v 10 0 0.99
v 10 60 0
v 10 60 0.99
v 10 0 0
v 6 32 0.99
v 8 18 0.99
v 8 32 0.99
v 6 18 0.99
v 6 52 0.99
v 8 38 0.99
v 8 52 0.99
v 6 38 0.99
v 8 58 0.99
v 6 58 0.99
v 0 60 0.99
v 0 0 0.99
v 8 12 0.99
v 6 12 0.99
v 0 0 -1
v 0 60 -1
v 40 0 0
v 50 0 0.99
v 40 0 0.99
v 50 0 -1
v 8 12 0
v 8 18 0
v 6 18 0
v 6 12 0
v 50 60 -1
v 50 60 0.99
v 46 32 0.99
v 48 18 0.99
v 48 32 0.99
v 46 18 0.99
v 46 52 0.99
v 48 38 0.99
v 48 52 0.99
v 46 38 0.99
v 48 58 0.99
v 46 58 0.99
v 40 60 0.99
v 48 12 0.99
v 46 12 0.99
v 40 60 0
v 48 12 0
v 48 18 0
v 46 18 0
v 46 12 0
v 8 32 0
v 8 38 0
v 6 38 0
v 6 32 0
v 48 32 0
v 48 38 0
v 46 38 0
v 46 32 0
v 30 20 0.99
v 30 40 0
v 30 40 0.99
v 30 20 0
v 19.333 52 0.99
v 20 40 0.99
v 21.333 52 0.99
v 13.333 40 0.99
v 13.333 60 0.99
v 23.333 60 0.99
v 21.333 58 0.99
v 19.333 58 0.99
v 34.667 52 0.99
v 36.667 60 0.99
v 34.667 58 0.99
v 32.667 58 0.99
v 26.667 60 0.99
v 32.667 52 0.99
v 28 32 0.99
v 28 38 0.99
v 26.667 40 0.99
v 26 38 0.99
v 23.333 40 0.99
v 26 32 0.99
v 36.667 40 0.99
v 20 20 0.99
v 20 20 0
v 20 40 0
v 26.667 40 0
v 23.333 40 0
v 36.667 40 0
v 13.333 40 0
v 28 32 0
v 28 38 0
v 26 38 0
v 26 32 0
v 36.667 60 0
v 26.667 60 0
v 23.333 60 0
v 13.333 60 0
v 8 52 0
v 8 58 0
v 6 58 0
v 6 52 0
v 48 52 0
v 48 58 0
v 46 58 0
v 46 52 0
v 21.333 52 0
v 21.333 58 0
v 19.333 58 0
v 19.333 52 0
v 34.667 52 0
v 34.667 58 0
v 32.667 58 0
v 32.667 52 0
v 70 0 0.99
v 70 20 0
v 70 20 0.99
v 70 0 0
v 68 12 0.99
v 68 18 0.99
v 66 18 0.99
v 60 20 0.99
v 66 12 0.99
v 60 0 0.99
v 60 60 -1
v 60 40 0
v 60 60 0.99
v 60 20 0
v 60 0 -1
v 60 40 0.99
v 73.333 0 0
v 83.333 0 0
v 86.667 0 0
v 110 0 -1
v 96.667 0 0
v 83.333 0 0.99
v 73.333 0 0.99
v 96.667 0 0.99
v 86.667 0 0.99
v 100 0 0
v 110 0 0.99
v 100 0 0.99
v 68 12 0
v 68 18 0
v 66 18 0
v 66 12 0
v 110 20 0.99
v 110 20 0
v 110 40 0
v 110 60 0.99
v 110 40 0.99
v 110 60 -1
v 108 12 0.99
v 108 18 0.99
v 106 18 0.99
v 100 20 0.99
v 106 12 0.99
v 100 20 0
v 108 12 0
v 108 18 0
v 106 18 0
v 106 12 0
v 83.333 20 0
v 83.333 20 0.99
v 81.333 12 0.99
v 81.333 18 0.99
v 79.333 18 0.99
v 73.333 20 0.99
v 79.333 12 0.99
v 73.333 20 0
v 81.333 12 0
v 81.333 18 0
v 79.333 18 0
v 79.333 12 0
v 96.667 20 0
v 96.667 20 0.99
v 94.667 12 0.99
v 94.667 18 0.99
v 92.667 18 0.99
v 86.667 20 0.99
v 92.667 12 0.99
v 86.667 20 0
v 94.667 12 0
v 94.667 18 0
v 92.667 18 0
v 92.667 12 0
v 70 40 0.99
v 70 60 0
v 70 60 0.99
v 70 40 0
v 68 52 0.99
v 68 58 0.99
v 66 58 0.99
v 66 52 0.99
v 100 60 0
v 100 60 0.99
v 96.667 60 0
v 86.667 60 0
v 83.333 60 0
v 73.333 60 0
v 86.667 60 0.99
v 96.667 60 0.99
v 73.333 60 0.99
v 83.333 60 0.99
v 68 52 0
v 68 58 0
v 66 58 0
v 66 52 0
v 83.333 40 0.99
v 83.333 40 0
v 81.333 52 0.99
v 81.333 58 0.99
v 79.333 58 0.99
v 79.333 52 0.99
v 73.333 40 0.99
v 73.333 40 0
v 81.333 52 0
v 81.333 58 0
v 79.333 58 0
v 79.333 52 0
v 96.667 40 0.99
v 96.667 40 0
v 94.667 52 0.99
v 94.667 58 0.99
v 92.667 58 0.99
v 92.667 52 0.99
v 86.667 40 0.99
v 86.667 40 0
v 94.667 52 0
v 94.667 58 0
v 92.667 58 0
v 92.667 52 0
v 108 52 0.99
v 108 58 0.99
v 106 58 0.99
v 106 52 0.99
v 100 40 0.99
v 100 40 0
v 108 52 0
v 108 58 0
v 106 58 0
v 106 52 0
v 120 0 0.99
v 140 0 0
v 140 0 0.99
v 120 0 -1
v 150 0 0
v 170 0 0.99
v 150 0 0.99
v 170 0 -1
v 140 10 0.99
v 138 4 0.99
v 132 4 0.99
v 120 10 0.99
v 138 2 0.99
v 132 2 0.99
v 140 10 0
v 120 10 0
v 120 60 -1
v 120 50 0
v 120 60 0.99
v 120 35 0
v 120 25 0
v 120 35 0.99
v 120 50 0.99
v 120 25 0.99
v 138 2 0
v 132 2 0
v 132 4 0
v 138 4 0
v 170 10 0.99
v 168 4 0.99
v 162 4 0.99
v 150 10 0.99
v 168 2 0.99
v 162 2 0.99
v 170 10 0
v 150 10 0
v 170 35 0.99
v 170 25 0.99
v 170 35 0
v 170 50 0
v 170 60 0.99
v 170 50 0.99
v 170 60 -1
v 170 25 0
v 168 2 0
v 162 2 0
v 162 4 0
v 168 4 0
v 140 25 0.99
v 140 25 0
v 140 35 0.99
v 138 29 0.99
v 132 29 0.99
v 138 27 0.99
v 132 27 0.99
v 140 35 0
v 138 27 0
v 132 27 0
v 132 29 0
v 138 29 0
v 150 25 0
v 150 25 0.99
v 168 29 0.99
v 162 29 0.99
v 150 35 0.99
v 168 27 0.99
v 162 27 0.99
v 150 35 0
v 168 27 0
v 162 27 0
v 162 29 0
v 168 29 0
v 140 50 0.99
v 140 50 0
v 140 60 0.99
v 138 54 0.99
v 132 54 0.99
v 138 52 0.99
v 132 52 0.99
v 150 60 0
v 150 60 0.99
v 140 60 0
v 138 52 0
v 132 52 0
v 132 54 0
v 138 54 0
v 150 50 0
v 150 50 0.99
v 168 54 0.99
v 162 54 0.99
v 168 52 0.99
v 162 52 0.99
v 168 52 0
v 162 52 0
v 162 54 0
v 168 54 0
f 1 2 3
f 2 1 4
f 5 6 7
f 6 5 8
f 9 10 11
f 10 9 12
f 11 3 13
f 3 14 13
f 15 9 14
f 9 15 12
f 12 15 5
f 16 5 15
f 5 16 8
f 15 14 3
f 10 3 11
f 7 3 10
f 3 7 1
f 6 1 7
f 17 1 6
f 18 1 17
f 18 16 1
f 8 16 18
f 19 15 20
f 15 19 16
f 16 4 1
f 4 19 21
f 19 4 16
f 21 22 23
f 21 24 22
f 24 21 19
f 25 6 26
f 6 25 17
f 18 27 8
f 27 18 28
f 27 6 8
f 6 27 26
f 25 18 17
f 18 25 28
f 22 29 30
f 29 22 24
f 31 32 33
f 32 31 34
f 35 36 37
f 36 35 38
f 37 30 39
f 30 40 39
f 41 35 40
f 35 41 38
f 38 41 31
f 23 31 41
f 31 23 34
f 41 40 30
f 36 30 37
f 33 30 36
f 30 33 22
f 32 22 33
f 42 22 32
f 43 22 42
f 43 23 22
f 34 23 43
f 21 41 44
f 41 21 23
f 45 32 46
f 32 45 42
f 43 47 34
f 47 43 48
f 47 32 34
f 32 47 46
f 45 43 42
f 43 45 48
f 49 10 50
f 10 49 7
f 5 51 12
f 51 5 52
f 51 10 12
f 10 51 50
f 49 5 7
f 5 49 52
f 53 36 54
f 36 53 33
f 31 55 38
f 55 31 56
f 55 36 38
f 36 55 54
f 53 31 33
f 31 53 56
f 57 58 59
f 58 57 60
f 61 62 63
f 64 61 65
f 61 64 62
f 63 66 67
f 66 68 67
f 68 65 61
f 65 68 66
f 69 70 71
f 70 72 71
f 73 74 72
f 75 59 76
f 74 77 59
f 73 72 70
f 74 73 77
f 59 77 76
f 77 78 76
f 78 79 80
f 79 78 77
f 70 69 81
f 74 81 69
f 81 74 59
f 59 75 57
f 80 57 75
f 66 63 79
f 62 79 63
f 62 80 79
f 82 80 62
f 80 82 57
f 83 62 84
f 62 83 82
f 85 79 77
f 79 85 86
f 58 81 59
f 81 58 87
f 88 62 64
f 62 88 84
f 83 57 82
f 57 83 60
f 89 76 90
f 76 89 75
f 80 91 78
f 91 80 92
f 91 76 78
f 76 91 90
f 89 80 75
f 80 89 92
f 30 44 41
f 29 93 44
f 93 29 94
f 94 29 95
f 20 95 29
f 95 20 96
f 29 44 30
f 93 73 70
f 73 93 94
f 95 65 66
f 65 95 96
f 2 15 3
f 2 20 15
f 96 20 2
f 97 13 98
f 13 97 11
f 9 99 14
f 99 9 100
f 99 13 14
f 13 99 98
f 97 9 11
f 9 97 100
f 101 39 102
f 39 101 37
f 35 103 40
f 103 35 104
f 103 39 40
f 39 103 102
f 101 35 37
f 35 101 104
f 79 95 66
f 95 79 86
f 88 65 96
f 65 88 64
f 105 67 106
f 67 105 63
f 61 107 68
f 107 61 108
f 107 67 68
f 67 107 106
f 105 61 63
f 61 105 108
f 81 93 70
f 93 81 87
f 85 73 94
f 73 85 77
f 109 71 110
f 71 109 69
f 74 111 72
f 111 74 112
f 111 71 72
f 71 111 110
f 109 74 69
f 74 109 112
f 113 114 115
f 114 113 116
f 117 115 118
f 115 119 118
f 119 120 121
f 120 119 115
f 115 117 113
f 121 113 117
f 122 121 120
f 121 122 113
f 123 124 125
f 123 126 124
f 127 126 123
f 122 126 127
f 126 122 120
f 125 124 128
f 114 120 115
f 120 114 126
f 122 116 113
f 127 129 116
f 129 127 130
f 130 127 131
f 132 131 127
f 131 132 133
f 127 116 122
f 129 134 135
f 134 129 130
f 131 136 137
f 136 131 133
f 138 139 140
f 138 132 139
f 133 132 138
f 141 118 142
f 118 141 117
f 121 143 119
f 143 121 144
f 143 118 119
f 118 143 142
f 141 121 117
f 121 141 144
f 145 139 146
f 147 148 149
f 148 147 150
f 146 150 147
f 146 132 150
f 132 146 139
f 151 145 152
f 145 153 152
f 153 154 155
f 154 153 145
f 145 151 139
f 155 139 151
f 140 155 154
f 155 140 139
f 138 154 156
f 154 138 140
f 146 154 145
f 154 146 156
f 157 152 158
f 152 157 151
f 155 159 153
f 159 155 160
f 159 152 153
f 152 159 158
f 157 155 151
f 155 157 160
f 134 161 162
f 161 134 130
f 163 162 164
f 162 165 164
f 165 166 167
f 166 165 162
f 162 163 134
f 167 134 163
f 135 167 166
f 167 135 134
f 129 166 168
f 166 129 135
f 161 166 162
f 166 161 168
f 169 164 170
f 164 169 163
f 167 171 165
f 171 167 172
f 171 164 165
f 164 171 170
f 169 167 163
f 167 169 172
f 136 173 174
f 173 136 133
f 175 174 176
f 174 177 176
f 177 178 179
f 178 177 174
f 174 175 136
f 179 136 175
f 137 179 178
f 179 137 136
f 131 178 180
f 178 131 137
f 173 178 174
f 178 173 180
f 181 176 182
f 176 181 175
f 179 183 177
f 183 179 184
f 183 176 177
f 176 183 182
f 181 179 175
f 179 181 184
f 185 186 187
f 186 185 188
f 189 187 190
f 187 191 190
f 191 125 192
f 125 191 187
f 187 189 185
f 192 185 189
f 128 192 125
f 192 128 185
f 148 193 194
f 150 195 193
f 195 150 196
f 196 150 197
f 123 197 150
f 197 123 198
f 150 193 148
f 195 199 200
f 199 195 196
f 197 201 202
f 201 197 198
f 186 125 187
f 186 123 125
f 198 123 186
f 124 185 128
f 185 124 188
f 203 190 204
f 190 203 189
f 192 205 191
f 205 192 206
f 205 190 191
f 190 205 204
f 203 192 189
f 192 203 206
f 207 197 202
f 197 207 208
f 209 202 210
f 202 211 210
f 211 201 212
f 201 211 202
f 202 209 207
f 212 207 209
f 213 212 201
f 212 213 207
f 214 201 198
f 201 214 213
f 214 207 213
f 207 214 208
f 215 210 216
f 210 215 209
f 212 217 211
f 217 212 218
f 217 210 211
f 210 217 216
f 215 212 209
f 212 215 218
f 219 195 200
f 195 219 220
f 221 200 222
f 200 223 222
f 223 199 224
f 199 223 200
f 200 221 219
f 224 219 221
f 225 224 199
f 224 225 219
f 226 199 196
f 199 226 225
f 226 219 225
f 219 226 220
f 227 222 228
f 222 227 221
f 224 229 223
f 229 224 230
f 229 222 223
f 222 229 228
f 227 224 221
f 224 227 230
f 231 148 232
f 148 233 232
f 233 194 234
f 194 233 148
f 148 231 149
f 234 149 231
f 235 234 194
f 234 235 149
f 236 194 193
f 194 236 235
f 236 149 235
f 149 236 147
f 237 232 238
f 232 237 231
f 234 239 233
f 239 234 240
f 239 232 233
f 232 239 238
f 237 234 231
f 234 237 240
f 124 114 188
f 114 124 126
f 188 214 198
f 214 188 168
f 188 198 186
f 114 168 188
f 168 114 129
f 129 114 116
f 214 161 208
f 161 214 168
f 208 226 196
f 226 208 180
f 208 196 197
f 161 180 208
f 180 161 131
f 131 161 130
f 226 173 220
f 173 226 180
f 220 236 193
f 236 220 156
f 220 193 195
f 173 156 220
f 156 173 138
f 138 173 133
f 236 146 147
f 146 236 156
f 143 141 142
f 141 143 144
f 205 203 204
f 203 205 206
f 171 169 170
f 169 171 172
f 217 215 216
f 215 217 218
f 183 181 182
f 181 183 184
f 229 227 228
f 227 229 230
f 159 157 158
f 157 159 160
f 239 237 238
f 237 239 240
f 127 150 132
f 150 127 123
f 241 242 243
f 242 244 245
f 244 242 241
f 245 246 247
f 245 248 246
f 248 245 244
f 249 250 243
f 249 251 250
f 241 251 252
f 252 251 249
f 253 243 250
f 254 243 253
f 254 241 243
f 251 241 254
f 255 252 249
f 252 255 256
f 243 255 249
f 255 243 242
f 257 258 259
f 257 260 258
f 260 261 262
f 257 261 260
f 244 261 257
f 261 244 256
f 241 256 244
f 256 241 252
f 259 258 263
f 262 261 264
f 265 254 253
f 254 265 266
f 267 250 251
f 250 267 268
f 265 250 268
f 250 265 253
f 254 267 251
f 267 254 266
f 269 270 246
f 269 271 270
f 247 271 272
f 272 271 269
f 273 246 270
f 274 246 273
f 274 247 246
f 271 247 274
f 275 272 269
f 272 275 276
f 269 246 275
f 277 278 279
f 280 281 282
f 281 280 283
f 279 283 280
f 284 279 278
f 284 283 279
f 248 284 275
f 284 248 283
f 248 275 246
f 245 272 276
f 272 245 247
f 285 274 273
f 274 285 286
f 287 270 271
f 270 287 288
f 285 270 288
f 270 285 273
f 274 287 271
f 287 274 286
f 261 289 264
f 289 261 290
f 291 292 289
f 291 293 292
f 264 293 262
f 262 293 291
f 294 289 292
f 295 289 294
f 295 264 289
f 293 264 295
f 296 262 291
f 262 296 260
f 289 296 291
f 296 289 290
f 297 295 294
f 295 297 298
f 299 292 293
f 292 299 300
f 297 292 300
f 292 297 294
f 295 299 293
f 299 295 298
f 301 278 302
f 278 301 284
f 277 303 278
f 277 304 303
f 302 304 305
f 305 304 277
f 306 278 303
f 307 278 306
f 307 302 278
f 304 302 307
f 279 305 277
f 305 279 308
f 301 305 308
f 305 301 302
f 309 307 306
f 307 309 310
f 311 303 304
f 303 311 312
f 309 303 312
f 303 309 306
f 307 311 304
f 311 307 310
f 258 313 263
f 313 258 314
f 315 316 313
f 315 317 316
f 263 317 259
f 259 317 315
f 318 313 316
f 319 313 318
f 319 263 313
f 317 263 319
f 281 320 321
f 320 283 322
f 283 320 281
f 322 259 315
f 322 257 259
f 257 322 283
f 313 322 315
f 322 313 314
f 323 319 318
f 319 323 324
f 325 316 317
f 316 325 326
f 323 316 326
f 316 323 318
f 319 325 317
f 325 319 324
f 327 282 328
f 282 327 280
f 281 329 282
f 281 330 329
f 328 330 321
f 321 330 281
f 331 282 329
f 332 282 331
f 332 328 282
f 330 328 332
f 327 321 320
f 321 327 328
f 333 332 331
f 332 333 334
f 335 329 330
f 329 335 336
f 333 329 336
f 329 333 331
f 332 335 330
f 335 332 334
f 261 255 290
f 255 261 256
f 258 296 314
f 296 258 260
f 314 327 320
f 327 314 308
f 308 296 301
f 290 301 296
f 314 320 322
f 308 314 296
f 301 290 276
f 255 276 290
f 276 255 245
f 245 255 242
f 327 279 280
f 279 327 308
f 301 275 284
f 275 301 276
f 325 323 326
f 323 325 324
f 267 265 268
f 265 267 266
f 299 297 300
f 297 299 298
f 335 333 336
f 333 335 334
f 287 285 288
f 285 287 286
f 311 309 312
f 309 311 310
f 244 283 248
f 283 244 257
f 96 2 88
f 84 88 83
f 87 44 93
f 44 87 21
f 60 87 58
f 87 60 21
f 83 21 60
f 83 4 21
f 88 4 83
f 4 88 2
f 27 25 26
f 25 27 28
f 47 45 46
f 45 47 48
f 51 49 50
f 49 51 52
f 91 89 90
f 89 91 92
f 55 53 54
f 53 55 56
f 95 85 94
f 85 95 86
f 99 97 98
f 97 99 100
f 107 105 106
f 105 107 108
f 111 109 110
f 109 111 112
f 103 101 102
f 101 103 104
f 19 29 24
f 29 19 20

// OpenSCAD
// file: ../../Base/Boxes.scad
// Fischertechnik Box Foundation
// Pre-designed Boxes

use <Constants.scad>

include <PlacementOptions.scad>

box190Width = 190;
box190Depth = 130;
box130Width = 130;
box130Depth = 95;
boxUsageHeight = 33.9;
boxWallThickness = 2.4;
boxBaseThickness = 1.0;

// getBoxWallThickness()
// Gets the wall thickness of a Fischertechnik Box

function getBoxWallThickness() = boxWallThickness;

// Gets the usable height of a fischertechnik box
function getBoxUsageHeight() = boxUsageHeight;

// Gets the thickness of the Fischertechnik box base.
function getBoxBaseThickness() = boxBaseThickness;

// Gets the usable inner space of a Box 190 as an x/y-list
function getBox190Space() = [
    box190Width - 2*getBoxWallThickness(), 
    box190Depth - 2*getBoxWallThickness() ];

// Imports the Fischertechnik empty box 130x190 mm and places it at position 0,0
// 190x130 are the outer sizes, the inner space is slightly smaller. Use getBox190Space() to get the inner sizes.
// This module needs the STL file "Fischertechnik Box 130x190.stl" in the library path.
// The box is positioned that the usable inner space is at the 0,0,0 position. The

module Box190() {
    translate([-getBoxWallThickness(),-getBoxWallThickness(),-getBoxBaseThickness()])
        import("Fischertechnik Box 130x190.stl", convexity=3);
}

// Gets the usable inner space of a Box 130 as an x/y-list
function getBox130Space() = [
    box130Width - 2*getBoxWallThickness(), 
    box130Depth - 2*getBoxWallThickness() ];

// Imports the Fischertechnik empty box 95x130 mm and places it at position 0,0
// 190x130 are the outer sizes, the inner space is slightly smaller. Use getBox190Space() to get the inner sizes.
// This module needs the STL file "Fischertechnik Box 95x130.stl" in the library path.
// The box is positioned that the usable inner space is at the 0,0,0 position. The

module Box130() {
    translate([-getBoxWallThickness(),-getBoxWallThickness(),-getBoxBaseThickness()])
        import("Fischertechnik Box 95x130.stl", convexity=3);
}

// Creates a web at the specified box walls
// corner 0 = LowerLeft, 1 = UpperLeft, 2 = UpperRight, 3 = LowerRight
// side 0 = LeftOfCorner, 1 = RightOfCorner
// distance = Distance in mm from the corner
// box = inner width and depth of the box (default: Box 190)
// webWidth = length of the web (default is 3 mms)
// webThickness = thickness of the web (default is 1 mm)

module BoxWeb(corner, side, distance, box=getBox190Space(), webWidth=3, webThickness=1.0) {
    sink = getBoxWallThickness()/2;

    width = (corner % 2 == 0) ? 
            (side == LeftOfCorner ? webWidth : webThickness) :
            (side == LeftOfCorner ? webThickness : webWidth);

    depth = (corner % 2 == 0) ? 
            (side == RightOfCorner ? webWidth : webThickness) :
            (side == RightOfCorner ? webThickness : webWidth);
    
    xDiff = corner == LowerLeft ? 
                (side == LeftOfCorner ? -sink : distance) :
            (corner == UpperLeft ?                
                (side == LeftOfCorner ? distance : -sink) :
            (corner == UpperRight ?
                (side == LeftOfCorner ? box.x-webWidth+sink : box.x-distance-webThickness) :
                (side == LeftOfCorner ? box.x-distance-webThickness: box.x-webWidth+sink)));

    yDiff = corner == LowerLeft ? 
                (side == RightOfCorner ? -sink : distance) :
            (corner == UpperLeft ?
                (side == RightOfCorner ? box.y-distance : box.y-webWidth+sink) :
            (corner == UpperRight ?
                (side == RightOfCorner ? box.y-webWidth+sink : box.y-distance) :
                (side == RightOfCorner ? distance : -sink)));
    
    translate([xDiff, yDiff, -getExcess()])
        cube([width, depth, boxUsageHeight + 2*getExcess()]);
}
// file: ../../Base/Alignment.scad
// Fischertechnik Box Foundation
// Geometry Helpers Alignment

include <PlacementOptions.scad>

// getAlignedX(elementWidth, spaceWidth, align=AlignRight, offset=0)
// Gets the aligned X offset of an element with the given
// width in the given space.
// elementWidth = The width of the element to positon
// spaceWidth = The space where the element should be aligned
// align = 0 AlignLeft, 1 AlignCenter, 2 AlignRight
// offset = an optional offset from the aligned position. When
// aligned left or centered, then positive values are in X direction.
// When aligned right then positive values are in negative X direction.

function getAlignedX(elementWidth, spaceWidth, align=AlignRight, offset=0) =
    (align == AlignLeft) ?
        offset :
        ((align == AlignCenter) ?
        (spaceWidth - elementWidth)/2 + offset :
        spaceWidth - offset - elementWidth);

// getAlignedY(elementDepth, spaceDepth, align=AlignTop, offset=0)
// Gets the aligned Y offset of an element with the given
// depth in the given space.
// elementDepth = The depth of the element to positon
// spaceDepth = The space where the element should be aligned
// align = 0 AlignBottom, 1 AlignCenter, 2 AlignTop
// offset = an optional offset from the aligned position. When
// aligned bottom or centered, then positive values are in Y direction.
// When aligned top then positive values are in negative Y direction.

function getAlignedY(elementDepth, spaceDepth, align=AlignTop, offset=0) =
    (align == AlignBottom) ?
        offset :
        ((align == AlignCenter) ?
        (spaceDepth - elementDepth)/2 + offset :
        spaceDepth - offset - elementDepth);
// file: ../../Base/Rotation.scad
// Fischertechnik Box Foundation
// Geometry Helpers Rotation

include <PlacementOptions.scad>

// getRotatedSpace(space, rotation=NoRotation)
// Rotates the space dependent on the specified rotation

function getRotatedSpace(space, rotation=NoRotation) = [
    (rotation == Rotate90 || rotation == Rotate270) ? space.y : space.x,
    (rotation == Rotate90 || rotation == Rotate270) ? space.x : space.y
];

// Rotates the given space around the fixed left lower corner
// space = the space the children needs as width/depth list [width,depth]
// rotation = 0 Rotate0 degrees, 1 Rotate90 degrees, 2 Rotate180 degrees, 3 Rotate270 degrees (equivalent to -90)

module RotateFix(space, rotation=Rotate0) {
    dy = (rotation == Rotate0 || rotation == Rotate270) ? 0 :
        (rotation == Rotate90) ? space.x :
        space.y;
    dx = (rotation < Rotate180) ? 0 :
        (rotation == Rotate180) ? space.x :
        space.y;
    
    translate([dx, dy, 0])
        rotate([0, 0, rotations[rotation]])
            children();
}
// file: ../../Base/Placement.scad
// Fischertechnik Box Foundation
// Geometry Helpers Placement

use <Constants.scad>
use <Alignment.scad>
use <Rotation.scad>
use <Boxes.scad>

include <PlacementOptions.scad>

// Place(x=0, y=0, elementSpace=[0,0], alignX=AlignLeft, alignY=AlignBottom, rotation=Rotate0, boxSpace=getBox190Space())
// Places the child at the specified position
// y = Y-Position. This is a relative position when an X aligment is specified.
// x = X-Position. This is a relative position when an Y aligment is specified.
// elementSpace = space of the element to be placed [x,y]
// alignX = -1=NoAlign, 0 AlignLeft, 1 AlignCenter, 3 AlignRight (elementSpace and boxSpace required!)
// alignY = -1=NoAlign, 2 AlignBottom, 1 AlignCenter, 4 AlignTop (elementSpace and boxSpace required!)
// rotation = 0 Rotate0 0 degrees, 1 Rotate90 90 degrees, 
// 2 Rotate180 180 degrees, 3 Rotate270 270 degrees (equivalent to -90)
// boxSpace = Inner space of the box where the placement occurs [x,y] - default is Box 190x130 inner space

module Place(x=0, y=0, elementSpace=[0,0], 
  alignX=AlignLeft, alignY=AlignBottom, 
  rotation=NoRotation, boxSpace=getBox190Space()) {

    module Position(x, y, space, rotation=Rotate0) {
        translate([x, y, 0])
            RotateFix(space, rotation)
                children(0);
    }

    space = getRotatedSpace(elementSpace, rotation);
    alignedX = getAlignedX(space.x, boxSpace.x, alignX, x);
    alignedY = getAlignedY(space.y, boxSpace.y, alignY, y);
    Position(alignedX, alignedY, elementSpace, rotation)
        children(0);
}

// Center(space=getBox130Space(), elementSpace=[0,0])
// space = Space where the children is centered. For cylinder use centered=true and no elementSpace.
// elementSpace = space of the element to be centered [x,y]

module Center(space=getBox190Space(), elementSpace=[0,0]) {
    translate([(space.x - elementSpace.x) / 2, (space.y - elementSpace.y) / 2])
        children(0);
}

// CenterHorizontal(width=0, y=0, offset=0, space=getBox130Space())
// space = Space where the children is centered. For cylinder use centered=true and no elementSpace.
// elementSpace = space of the element to be centered [x,y]

module CenterHorizontal(width=0, y=0, offset=0, space=getBox190Space()) {
    translate([(space.x - width) / 2 + offset, y])
        children(0);
}

// CenterVertical(depth=0, x=0, offset=0, space=getBox130Space())
// space = Space where the children is centered. For cylinder use centered=true and no elementSpace.
// elementSpace = space of the element to be centered [x,y]

module CenterVerticalal(depth=0, x=0, offset=0, space=getBox190Space()) {
    translate([x, (space.y - depth) / 2 + offset])
        children(0);
}
// file: ../../Base/Constants.scad
// Fischertechnik Box Foundation
// Constants

// Constant values necessary for multiple elements

// Base constants
dividerThickness = 1.2;
excess = 0.01;
fragments = 90;
tolerance = 0.8;

// Gets the thickness of a divider 
function getDividerThickness() = dividerThickness;

// Gets the excess that is used to merge walls into each other
function getExcess() = excess;

// Gets amount of fragments of a cylinder
function getFragments() = fragments;

// Gets the inner tolerance of a frame to each side
function getTolerance() = tolerance;


// Fischertechnik specific constants
axisDiameter = 4;
axisBottomDiameter = axisDiameter + 1;
standardEdgeDistance = 2.5;
standardWebDistance = 11.5;
standardCornerLength = 15;
tubeWallFactor = 1.6;

// Gets axis diameter
function getAxisDiameter() = axisDiameter;

// Gets axis bottom diameter for thicker part at the bottom
function getAxisBottomDiameter() = axisBottomDiameter;

// gets the standard distance to the wall of the box for dockable frames with webs
function getStandardEdgeDistance() = standardEdgeDistance;

// gets the standard distance of each web to the corner of the dockable frame
function getStandardWebDistance() = standardWebDistance;

// gets the standard length of the corner walls of a dockable frame
function getStandardCornerLength() = standardCornerLength;

// gets the wall thickness of a tube.
function getTubeWallThickness() = tubeWallFactor * getDividerThickness();
// file: ../TestHelper.scad
// Fischertechnik Box Foundation
// Test Helper

function getPlacementBaseSpace() = [50,60];
function getCubeSpace() = [10,20];

module PlacementBase() {
    color("green")
    translate([0, 0, -1])
        cube([getPlacementBaseSpace().x, getPlacementBaseSpace().y, 1]);
}

module Cube() {
    translate([0,0,-.01])
    difference() {
        cube([getCubeSpace().x,getCubeSpace().y,1]);
        translate([getCubeSpace().x*0.6, getCubeSpace().y*0.6, -1])
            cube([getCubeSpace().x*0.2,getCubeSpace().y*0.3,3]);
    }
}

module Deploy(distance=30) {
    for( i = [0:1:$children-1])
        translate([i*distance, 0])
            children(i);
}
// file: ../../Base/PlacementOptions.scad
// Fischertechnik Box Foundation
// Placement Options

// Alignment
NoAlign = 0;
AlignLeft = 1;
AlignBottom = 2;
AlignCenter = 3;
AlignRight = 4;
AlignTop = 5;

// Element rotation degree steps
rotations = [0, -90, -180, -270];

// Rotation
NoRotation = 0;
Rotate0 = 0;
Rotate90 = 1;
Rotate180 = 2;
Rotate270 = 3;

// Docking (seen from above)
NoDock = -1;
DockLeft = 0;
DockTop = 1;
DockRight = 2;
DockCorner = 2;
DockBottom = 3;

// Web corners
LowerLeft = 0;
UpperLeft = 1;
UpperRight = 2;
LowerRight = 3;

// Web position relative to corner
LeftOfCorner = 0;
RightOfCorner = 1;
// file: ../../Base/Deployment.scad
// Fischertechnik Box Foundation
// Geometry Helpers Deployment

use <Constants.scad>
use <Placement.scad>
use <Rotation.scad>

include <PlacementOptions.scad>

// getWidth(spaces, rotations, count, i=0)
// Gets the sum of the width of count specified spaces, including rotations for each space.
// spaces = List of spaces from which the width should be added. Used internally for DeployRow.
// rotations = specify rotations for each space to get its correct width
// count = The count of spaces from the specified spaces that should be included in the sum (for recursive call)
// i = The space index offset used to start to add (for recursive call)

function getWidth(spaces, rotations, count, i=0) = 
    (i < count) ? 
        getRotatedSpace(spaces[i], rotations[i]).x + getWidth(spaces, rotations, count, i+1) : 
        0;

// getX(spaces, rotations, distance, i)
// Calculates the X position of the space with the index i, when the spaces are placed with the given
// equal distances. Used internally for DeployRow.
// spaces = List of spaces from which the width should be added
// rotations = specify rotations for each space to get its correct width
// distance = Equal distance between each space
// i = Index of the space to get its X position for

function getX(spaces, rotations, distance, i) = 
    (i == 0) ? 
        0 :
        (getRotatedSpace(spaces[i-1], rotations[i-1]).x + distance + getX(spaces, rotations, distance, i-1));

// DeployRow(width, spaces, rotations)
// Deploys the elements in the specified width with equal distances.
// rowWidth = The width of the row in mm.
// spaces = The spaces of all elements to deploy.
// rotations = The rotations of each element: 0 Rotate0 0 degrees, 1 Rotate90 90 degrees, 
// 2 Rotate180 180 degrees, 3 Rotate270 270 degrees (equivalent to -90).

module DeployRow(rowWidth, spaces, rotations) {
    distance = (rowWidth - getWidth(spaces, rotations, len(spaces))) / (len(spaces)-1);
    
    for (i = [0:1:$children-1]) {
        x = getX(spaces, rotations, distance, i);
        translate([x, 0])
            RotateFix(spaces[i], rotations[i])
                children(i);
    }
}

// DeploySame(space, elementSpace, columns=2, rows=1, rotation=Rotate0)
// Deploys columns and rows of the specified child in the specified space with
// equal distances
// space = The space where the element copies are deployed
// elementSpace = The space the child needs
// columns = Count of elements per row
// rows = Count of rows deployed
// rotation = The rotation of the child that will be applied

module DeploySame(space, elementSpace, columns=2, rows=1, rotation=Rotate0) {
    
    elementWidth = getRotatedSpace(elementSpace, rotation).x;
    columnDistance = (space.x - columns * elementWidth) / (columns > 1 ? columns - 1 : 1);
    endColumnOffset = space.x - elementWidth;
    columnOffsetStep = elementWidth + columnDistance;
    
    elementDepth = getRotatedSpace(elementSpace, rotation).y;
    rowDistance = (space.y - rows * elementDepth) / (rows > 1 ? rows - 1 : 1);
    endRowOffset = space.y - elementDepth;
    rowOffsetStep = elementDepth + rowDistance;
    
    for (rowOffset = [0:rowOffsetStep:endRowOffset]) {
        for (columnOffset = [0:columnOffsetStep:endColumnOffset]) {
            translate([columnOffset, rowOffset])
                RotateFix(elementSpace, rotation)
                    children(0);
        }
    }
}

// getMergedRowWidth(spaces, rotations, count, i=0)
// Gets the width of the merged spaces with the specified rotations.
// Merging works all elements with two frame walls. 
// The right and left walls are merged into one single wall.
// spaces = List of spaces from which the width should be added.
// rotations = specify rotations for each space to get its correct width
// count = The count of spaces from the specified spaces that should be included in the sum (for recursive call)
// i = The space index offset used to start to add (for recursive call)

function getMergedRowWidth(spaces, rotations, count, i=0) =
    (i < count) ? 
        getRotatedSpace(spaces[i], rotations[i]).x + getWidth(spaces, rotations, count, i+1) - (i > 0 ? getDividerThickness() : 0) : 
        0;

// MergeRow(spaces, rotations, dividerThickness=0.8)
// Deploys the children so that all walls of the neighbors are merged in a single common wall.
// spaces = List of spaces of the children to get the sizes from.
// rotations = specify rotations for each space to get its correct width
// dividerThickness = Thickness of all dividers of the elements (default is 0.8)

module MergeRow(spaces, rotations, dividerThickness = getDividerThickness()) {
    for (i = [0:1:$children-1]) {
        x = getX(spaces, rotations, -getDividerThickness(), i);
        translate([x, 0, 0])
            RotateFix(spaces[i], rotations[i])
                children(i);
    }
}

// Merge(count, space, rotation, dividerThickness=0.8)
// Deploys the child count times so that all walls of the neighbors are merged in a single common wall.
// space = Space of the child to get the sizes from.
// rotation = rotation of the child to get the correct width
// dividerThickness = Thickness of all dividers of the element (default is 0.8)

module Merge(count, space, rotation, dividerThickness = getDividerThickness()) {
    x = getRotatedSpace(space, rotation).x - getDividerThickness();
    for (offset = [0:x:(count-1)*x]) {
        echo(offset);
        translate([offset, 0, 0])
            RotateFix(space, rotation)
                children(0);
    }
}
// main file
// Fischertechnik Box Foundation
// Base
// Test Deploy

use <../../Base/Deployment.scad>

include <../../Base/PlacementOptions.scad>

use <../TestHelper.scad>

PlacementBase();

DeploySame(getPlacementBaseSpace(), getCubeSpace())
    Cube();

translate([0, 20])
DeploySame(getPlacementBaseSpace(), getCubeSpace(), columns=3)
    Cube();

translate([0, 40])
DeploySame(getPlacementBaseSpace(), getCubeSpace(), columns=4)
    Cube();
    
translate([60, 0]) {
PlacementBase();
DeploySame(getPlacementBaseSpace(), getCubeSpace(), columns=4, rows=2)
    Cube();
}

translate([120, 0]) {
PlacementBase();
DeploySame(getPlacementBaseSpace(), getCubeSpace(), columns=2, rows=3, rotation=Rotate90)
    Cube();
}
